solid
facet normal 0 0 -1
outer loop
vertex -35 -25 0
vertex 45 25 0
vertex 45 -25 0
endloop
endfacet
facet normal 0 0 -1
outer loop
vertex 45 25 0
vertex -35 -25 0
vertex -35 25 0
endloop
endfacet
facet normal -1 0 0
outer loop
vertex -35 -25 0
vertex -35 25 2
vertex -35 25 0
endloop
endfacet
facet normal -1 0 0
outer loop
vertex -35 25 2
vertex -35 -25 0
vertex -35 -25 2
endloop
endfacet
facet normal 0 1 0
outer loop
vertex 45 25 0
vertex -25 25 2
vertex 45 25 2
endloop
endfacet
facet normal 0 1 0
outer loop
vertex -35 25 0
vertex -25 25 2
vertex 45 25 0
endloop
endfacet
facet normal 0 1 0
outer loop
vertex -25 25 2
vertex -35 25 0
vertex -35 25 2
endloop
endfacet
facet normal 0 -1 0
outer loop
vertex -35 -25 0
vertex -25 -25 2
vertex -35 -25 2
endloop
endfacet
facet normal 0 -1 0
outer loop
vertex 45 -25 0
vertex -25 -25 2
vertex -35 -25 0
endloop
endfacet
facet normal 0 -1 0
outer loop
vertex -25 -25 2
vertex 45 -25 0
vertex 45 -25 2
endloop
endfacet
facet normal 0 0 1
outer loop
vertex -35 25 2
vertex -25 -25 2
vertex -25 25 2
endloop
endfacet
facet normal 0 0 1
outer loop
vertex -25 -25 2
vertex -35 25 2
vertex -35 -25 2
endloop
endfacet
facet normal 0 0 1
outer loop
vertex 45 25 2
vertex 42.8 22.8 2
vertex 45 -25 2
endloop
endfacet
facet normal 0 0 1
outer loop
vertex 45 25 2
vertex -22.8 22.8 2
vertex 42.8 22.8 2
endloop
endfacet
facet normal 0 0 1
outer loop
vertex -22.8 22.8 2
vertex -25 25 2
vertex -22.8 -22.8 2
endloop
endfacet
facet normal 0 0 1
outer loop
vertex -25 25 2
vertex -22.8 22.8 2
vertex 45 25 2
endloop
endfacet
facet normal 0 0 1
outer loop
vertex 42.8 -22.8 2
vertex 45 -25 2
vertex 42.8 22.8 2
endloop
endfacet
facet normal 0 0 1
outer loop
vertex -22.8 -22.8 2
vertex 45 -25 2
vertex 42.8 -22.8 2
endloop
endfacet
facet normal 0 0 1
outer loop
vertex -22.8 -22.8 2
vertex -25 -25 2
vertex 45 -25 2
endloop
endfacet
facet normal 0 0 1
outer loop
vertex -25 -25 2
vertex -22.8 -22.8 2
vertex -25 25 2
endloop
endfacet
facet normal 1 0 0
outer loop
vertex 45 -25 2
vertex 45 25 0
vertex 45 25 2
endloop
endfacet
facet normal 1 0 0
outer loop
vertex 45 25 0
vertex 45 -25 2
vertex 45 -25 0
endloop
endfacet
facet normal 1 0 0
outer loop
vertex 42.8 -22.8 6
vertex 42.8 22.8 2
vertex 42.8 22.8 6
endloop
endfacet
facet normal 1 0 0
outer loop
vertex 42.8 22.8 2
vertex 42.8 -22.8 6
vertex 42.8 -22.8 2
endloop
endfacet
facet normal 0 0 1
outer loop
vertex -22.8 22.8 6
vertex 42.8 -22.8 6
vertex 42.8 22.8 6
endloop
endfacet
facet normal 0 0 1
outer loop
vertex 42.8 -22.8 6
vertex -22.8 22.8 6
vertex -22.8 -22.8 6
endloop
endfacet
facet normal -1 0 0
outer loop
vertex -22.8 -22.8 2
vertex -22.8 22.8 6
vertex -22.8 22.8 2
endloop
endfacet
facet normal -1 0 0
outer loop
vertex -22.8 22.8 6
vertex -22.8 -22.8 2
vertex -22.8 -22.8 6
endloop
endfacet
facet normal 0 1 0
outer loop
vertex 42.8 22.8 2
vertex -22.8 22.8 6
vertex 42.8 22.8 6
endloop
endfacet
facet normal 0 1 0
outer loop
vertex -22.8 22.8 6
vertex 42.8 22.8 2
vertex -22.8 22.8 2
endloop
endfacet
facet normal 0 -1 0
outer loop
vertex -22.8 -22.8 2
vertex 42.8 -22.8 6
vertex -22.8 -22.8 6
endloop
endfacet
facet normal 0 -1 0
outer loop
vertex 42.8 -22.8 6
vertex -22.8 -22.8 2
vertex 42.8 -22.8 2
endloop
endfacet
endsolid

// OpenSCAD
// Two-part enclosure for small electronics board (e.g. Arduino-based temperature logger)
// Print orientation: box upright, lid upside down on the bed, 10 mm gap between them

// ---------------- Parameters ----------------
box_x      = 70;    // box outer size in X (mm)
box_y      = 50;    // box outer size in Y (mm)
box_z      = 30;    // box outer size in Z (mm)
box_wall   = 2;     // box wall thickness (mm)
box_floor  = 2;     // box floor thickness (mm)

lid_plate_x      = 70;   // lid plate size in X (mm)
lid_plate_y      = 50;   // lid plate size in Y (mm)
lid_plate_t      = 2;    // lid plate thickness (mm)

lip_outer_x      = 65.6; // lip outer size in X (mm)
lip_outer_y      = 45.6; // lip outer size in Y (mm)
lip_wall         = 1.5;  // lip wall thickness (mm)
lip_height       = 4;    // lip height above plate (mm)

clearance        = 0.2;  // clearance between lip inner size and box opening (mm)
gap_between      = 10;   // gap between box and lid (mm)
eps              = 0.5;  // cutter overshoot past faces (mm)

$fn = 64;

// Derived
lip_inner_x = lip_outer_x - 2 * lip_wall - 2 * clearance;  // 61.6
lip_inner_y = lip_outer_y - 2 * lip_wall - 2 * clearance;  // 45.2

// ---------------- Model ----------------
union() {
    // Box (open top)
    translate([-box_x/2, -box_y/2, 0])
        difference() {
            cube([box_x, box_y, box_z]);
            translate([0, 0, box_floor])
                cube([box_x, box_y, box_z - box_floor + eps]);  // open-top cut
        }

    // Lid (plate with lip, printed upside down)
    translate([gap_between, 0, 0])
        union() {
            // Plate lying on the bed
            translate([-lid_plate_x/2, -lid_plate_y/2, 0])
                cube([lid_plate_x, lid_plate_y, lid_plate_t]);

            // Lip on top of the plate (extends above it)
            translate([-lip_outer_x/2, -lip_outer_y/2, lid_plate_t])
                cube([lip_outer_x, lip_outer_y, lip_height]);
        }
}
